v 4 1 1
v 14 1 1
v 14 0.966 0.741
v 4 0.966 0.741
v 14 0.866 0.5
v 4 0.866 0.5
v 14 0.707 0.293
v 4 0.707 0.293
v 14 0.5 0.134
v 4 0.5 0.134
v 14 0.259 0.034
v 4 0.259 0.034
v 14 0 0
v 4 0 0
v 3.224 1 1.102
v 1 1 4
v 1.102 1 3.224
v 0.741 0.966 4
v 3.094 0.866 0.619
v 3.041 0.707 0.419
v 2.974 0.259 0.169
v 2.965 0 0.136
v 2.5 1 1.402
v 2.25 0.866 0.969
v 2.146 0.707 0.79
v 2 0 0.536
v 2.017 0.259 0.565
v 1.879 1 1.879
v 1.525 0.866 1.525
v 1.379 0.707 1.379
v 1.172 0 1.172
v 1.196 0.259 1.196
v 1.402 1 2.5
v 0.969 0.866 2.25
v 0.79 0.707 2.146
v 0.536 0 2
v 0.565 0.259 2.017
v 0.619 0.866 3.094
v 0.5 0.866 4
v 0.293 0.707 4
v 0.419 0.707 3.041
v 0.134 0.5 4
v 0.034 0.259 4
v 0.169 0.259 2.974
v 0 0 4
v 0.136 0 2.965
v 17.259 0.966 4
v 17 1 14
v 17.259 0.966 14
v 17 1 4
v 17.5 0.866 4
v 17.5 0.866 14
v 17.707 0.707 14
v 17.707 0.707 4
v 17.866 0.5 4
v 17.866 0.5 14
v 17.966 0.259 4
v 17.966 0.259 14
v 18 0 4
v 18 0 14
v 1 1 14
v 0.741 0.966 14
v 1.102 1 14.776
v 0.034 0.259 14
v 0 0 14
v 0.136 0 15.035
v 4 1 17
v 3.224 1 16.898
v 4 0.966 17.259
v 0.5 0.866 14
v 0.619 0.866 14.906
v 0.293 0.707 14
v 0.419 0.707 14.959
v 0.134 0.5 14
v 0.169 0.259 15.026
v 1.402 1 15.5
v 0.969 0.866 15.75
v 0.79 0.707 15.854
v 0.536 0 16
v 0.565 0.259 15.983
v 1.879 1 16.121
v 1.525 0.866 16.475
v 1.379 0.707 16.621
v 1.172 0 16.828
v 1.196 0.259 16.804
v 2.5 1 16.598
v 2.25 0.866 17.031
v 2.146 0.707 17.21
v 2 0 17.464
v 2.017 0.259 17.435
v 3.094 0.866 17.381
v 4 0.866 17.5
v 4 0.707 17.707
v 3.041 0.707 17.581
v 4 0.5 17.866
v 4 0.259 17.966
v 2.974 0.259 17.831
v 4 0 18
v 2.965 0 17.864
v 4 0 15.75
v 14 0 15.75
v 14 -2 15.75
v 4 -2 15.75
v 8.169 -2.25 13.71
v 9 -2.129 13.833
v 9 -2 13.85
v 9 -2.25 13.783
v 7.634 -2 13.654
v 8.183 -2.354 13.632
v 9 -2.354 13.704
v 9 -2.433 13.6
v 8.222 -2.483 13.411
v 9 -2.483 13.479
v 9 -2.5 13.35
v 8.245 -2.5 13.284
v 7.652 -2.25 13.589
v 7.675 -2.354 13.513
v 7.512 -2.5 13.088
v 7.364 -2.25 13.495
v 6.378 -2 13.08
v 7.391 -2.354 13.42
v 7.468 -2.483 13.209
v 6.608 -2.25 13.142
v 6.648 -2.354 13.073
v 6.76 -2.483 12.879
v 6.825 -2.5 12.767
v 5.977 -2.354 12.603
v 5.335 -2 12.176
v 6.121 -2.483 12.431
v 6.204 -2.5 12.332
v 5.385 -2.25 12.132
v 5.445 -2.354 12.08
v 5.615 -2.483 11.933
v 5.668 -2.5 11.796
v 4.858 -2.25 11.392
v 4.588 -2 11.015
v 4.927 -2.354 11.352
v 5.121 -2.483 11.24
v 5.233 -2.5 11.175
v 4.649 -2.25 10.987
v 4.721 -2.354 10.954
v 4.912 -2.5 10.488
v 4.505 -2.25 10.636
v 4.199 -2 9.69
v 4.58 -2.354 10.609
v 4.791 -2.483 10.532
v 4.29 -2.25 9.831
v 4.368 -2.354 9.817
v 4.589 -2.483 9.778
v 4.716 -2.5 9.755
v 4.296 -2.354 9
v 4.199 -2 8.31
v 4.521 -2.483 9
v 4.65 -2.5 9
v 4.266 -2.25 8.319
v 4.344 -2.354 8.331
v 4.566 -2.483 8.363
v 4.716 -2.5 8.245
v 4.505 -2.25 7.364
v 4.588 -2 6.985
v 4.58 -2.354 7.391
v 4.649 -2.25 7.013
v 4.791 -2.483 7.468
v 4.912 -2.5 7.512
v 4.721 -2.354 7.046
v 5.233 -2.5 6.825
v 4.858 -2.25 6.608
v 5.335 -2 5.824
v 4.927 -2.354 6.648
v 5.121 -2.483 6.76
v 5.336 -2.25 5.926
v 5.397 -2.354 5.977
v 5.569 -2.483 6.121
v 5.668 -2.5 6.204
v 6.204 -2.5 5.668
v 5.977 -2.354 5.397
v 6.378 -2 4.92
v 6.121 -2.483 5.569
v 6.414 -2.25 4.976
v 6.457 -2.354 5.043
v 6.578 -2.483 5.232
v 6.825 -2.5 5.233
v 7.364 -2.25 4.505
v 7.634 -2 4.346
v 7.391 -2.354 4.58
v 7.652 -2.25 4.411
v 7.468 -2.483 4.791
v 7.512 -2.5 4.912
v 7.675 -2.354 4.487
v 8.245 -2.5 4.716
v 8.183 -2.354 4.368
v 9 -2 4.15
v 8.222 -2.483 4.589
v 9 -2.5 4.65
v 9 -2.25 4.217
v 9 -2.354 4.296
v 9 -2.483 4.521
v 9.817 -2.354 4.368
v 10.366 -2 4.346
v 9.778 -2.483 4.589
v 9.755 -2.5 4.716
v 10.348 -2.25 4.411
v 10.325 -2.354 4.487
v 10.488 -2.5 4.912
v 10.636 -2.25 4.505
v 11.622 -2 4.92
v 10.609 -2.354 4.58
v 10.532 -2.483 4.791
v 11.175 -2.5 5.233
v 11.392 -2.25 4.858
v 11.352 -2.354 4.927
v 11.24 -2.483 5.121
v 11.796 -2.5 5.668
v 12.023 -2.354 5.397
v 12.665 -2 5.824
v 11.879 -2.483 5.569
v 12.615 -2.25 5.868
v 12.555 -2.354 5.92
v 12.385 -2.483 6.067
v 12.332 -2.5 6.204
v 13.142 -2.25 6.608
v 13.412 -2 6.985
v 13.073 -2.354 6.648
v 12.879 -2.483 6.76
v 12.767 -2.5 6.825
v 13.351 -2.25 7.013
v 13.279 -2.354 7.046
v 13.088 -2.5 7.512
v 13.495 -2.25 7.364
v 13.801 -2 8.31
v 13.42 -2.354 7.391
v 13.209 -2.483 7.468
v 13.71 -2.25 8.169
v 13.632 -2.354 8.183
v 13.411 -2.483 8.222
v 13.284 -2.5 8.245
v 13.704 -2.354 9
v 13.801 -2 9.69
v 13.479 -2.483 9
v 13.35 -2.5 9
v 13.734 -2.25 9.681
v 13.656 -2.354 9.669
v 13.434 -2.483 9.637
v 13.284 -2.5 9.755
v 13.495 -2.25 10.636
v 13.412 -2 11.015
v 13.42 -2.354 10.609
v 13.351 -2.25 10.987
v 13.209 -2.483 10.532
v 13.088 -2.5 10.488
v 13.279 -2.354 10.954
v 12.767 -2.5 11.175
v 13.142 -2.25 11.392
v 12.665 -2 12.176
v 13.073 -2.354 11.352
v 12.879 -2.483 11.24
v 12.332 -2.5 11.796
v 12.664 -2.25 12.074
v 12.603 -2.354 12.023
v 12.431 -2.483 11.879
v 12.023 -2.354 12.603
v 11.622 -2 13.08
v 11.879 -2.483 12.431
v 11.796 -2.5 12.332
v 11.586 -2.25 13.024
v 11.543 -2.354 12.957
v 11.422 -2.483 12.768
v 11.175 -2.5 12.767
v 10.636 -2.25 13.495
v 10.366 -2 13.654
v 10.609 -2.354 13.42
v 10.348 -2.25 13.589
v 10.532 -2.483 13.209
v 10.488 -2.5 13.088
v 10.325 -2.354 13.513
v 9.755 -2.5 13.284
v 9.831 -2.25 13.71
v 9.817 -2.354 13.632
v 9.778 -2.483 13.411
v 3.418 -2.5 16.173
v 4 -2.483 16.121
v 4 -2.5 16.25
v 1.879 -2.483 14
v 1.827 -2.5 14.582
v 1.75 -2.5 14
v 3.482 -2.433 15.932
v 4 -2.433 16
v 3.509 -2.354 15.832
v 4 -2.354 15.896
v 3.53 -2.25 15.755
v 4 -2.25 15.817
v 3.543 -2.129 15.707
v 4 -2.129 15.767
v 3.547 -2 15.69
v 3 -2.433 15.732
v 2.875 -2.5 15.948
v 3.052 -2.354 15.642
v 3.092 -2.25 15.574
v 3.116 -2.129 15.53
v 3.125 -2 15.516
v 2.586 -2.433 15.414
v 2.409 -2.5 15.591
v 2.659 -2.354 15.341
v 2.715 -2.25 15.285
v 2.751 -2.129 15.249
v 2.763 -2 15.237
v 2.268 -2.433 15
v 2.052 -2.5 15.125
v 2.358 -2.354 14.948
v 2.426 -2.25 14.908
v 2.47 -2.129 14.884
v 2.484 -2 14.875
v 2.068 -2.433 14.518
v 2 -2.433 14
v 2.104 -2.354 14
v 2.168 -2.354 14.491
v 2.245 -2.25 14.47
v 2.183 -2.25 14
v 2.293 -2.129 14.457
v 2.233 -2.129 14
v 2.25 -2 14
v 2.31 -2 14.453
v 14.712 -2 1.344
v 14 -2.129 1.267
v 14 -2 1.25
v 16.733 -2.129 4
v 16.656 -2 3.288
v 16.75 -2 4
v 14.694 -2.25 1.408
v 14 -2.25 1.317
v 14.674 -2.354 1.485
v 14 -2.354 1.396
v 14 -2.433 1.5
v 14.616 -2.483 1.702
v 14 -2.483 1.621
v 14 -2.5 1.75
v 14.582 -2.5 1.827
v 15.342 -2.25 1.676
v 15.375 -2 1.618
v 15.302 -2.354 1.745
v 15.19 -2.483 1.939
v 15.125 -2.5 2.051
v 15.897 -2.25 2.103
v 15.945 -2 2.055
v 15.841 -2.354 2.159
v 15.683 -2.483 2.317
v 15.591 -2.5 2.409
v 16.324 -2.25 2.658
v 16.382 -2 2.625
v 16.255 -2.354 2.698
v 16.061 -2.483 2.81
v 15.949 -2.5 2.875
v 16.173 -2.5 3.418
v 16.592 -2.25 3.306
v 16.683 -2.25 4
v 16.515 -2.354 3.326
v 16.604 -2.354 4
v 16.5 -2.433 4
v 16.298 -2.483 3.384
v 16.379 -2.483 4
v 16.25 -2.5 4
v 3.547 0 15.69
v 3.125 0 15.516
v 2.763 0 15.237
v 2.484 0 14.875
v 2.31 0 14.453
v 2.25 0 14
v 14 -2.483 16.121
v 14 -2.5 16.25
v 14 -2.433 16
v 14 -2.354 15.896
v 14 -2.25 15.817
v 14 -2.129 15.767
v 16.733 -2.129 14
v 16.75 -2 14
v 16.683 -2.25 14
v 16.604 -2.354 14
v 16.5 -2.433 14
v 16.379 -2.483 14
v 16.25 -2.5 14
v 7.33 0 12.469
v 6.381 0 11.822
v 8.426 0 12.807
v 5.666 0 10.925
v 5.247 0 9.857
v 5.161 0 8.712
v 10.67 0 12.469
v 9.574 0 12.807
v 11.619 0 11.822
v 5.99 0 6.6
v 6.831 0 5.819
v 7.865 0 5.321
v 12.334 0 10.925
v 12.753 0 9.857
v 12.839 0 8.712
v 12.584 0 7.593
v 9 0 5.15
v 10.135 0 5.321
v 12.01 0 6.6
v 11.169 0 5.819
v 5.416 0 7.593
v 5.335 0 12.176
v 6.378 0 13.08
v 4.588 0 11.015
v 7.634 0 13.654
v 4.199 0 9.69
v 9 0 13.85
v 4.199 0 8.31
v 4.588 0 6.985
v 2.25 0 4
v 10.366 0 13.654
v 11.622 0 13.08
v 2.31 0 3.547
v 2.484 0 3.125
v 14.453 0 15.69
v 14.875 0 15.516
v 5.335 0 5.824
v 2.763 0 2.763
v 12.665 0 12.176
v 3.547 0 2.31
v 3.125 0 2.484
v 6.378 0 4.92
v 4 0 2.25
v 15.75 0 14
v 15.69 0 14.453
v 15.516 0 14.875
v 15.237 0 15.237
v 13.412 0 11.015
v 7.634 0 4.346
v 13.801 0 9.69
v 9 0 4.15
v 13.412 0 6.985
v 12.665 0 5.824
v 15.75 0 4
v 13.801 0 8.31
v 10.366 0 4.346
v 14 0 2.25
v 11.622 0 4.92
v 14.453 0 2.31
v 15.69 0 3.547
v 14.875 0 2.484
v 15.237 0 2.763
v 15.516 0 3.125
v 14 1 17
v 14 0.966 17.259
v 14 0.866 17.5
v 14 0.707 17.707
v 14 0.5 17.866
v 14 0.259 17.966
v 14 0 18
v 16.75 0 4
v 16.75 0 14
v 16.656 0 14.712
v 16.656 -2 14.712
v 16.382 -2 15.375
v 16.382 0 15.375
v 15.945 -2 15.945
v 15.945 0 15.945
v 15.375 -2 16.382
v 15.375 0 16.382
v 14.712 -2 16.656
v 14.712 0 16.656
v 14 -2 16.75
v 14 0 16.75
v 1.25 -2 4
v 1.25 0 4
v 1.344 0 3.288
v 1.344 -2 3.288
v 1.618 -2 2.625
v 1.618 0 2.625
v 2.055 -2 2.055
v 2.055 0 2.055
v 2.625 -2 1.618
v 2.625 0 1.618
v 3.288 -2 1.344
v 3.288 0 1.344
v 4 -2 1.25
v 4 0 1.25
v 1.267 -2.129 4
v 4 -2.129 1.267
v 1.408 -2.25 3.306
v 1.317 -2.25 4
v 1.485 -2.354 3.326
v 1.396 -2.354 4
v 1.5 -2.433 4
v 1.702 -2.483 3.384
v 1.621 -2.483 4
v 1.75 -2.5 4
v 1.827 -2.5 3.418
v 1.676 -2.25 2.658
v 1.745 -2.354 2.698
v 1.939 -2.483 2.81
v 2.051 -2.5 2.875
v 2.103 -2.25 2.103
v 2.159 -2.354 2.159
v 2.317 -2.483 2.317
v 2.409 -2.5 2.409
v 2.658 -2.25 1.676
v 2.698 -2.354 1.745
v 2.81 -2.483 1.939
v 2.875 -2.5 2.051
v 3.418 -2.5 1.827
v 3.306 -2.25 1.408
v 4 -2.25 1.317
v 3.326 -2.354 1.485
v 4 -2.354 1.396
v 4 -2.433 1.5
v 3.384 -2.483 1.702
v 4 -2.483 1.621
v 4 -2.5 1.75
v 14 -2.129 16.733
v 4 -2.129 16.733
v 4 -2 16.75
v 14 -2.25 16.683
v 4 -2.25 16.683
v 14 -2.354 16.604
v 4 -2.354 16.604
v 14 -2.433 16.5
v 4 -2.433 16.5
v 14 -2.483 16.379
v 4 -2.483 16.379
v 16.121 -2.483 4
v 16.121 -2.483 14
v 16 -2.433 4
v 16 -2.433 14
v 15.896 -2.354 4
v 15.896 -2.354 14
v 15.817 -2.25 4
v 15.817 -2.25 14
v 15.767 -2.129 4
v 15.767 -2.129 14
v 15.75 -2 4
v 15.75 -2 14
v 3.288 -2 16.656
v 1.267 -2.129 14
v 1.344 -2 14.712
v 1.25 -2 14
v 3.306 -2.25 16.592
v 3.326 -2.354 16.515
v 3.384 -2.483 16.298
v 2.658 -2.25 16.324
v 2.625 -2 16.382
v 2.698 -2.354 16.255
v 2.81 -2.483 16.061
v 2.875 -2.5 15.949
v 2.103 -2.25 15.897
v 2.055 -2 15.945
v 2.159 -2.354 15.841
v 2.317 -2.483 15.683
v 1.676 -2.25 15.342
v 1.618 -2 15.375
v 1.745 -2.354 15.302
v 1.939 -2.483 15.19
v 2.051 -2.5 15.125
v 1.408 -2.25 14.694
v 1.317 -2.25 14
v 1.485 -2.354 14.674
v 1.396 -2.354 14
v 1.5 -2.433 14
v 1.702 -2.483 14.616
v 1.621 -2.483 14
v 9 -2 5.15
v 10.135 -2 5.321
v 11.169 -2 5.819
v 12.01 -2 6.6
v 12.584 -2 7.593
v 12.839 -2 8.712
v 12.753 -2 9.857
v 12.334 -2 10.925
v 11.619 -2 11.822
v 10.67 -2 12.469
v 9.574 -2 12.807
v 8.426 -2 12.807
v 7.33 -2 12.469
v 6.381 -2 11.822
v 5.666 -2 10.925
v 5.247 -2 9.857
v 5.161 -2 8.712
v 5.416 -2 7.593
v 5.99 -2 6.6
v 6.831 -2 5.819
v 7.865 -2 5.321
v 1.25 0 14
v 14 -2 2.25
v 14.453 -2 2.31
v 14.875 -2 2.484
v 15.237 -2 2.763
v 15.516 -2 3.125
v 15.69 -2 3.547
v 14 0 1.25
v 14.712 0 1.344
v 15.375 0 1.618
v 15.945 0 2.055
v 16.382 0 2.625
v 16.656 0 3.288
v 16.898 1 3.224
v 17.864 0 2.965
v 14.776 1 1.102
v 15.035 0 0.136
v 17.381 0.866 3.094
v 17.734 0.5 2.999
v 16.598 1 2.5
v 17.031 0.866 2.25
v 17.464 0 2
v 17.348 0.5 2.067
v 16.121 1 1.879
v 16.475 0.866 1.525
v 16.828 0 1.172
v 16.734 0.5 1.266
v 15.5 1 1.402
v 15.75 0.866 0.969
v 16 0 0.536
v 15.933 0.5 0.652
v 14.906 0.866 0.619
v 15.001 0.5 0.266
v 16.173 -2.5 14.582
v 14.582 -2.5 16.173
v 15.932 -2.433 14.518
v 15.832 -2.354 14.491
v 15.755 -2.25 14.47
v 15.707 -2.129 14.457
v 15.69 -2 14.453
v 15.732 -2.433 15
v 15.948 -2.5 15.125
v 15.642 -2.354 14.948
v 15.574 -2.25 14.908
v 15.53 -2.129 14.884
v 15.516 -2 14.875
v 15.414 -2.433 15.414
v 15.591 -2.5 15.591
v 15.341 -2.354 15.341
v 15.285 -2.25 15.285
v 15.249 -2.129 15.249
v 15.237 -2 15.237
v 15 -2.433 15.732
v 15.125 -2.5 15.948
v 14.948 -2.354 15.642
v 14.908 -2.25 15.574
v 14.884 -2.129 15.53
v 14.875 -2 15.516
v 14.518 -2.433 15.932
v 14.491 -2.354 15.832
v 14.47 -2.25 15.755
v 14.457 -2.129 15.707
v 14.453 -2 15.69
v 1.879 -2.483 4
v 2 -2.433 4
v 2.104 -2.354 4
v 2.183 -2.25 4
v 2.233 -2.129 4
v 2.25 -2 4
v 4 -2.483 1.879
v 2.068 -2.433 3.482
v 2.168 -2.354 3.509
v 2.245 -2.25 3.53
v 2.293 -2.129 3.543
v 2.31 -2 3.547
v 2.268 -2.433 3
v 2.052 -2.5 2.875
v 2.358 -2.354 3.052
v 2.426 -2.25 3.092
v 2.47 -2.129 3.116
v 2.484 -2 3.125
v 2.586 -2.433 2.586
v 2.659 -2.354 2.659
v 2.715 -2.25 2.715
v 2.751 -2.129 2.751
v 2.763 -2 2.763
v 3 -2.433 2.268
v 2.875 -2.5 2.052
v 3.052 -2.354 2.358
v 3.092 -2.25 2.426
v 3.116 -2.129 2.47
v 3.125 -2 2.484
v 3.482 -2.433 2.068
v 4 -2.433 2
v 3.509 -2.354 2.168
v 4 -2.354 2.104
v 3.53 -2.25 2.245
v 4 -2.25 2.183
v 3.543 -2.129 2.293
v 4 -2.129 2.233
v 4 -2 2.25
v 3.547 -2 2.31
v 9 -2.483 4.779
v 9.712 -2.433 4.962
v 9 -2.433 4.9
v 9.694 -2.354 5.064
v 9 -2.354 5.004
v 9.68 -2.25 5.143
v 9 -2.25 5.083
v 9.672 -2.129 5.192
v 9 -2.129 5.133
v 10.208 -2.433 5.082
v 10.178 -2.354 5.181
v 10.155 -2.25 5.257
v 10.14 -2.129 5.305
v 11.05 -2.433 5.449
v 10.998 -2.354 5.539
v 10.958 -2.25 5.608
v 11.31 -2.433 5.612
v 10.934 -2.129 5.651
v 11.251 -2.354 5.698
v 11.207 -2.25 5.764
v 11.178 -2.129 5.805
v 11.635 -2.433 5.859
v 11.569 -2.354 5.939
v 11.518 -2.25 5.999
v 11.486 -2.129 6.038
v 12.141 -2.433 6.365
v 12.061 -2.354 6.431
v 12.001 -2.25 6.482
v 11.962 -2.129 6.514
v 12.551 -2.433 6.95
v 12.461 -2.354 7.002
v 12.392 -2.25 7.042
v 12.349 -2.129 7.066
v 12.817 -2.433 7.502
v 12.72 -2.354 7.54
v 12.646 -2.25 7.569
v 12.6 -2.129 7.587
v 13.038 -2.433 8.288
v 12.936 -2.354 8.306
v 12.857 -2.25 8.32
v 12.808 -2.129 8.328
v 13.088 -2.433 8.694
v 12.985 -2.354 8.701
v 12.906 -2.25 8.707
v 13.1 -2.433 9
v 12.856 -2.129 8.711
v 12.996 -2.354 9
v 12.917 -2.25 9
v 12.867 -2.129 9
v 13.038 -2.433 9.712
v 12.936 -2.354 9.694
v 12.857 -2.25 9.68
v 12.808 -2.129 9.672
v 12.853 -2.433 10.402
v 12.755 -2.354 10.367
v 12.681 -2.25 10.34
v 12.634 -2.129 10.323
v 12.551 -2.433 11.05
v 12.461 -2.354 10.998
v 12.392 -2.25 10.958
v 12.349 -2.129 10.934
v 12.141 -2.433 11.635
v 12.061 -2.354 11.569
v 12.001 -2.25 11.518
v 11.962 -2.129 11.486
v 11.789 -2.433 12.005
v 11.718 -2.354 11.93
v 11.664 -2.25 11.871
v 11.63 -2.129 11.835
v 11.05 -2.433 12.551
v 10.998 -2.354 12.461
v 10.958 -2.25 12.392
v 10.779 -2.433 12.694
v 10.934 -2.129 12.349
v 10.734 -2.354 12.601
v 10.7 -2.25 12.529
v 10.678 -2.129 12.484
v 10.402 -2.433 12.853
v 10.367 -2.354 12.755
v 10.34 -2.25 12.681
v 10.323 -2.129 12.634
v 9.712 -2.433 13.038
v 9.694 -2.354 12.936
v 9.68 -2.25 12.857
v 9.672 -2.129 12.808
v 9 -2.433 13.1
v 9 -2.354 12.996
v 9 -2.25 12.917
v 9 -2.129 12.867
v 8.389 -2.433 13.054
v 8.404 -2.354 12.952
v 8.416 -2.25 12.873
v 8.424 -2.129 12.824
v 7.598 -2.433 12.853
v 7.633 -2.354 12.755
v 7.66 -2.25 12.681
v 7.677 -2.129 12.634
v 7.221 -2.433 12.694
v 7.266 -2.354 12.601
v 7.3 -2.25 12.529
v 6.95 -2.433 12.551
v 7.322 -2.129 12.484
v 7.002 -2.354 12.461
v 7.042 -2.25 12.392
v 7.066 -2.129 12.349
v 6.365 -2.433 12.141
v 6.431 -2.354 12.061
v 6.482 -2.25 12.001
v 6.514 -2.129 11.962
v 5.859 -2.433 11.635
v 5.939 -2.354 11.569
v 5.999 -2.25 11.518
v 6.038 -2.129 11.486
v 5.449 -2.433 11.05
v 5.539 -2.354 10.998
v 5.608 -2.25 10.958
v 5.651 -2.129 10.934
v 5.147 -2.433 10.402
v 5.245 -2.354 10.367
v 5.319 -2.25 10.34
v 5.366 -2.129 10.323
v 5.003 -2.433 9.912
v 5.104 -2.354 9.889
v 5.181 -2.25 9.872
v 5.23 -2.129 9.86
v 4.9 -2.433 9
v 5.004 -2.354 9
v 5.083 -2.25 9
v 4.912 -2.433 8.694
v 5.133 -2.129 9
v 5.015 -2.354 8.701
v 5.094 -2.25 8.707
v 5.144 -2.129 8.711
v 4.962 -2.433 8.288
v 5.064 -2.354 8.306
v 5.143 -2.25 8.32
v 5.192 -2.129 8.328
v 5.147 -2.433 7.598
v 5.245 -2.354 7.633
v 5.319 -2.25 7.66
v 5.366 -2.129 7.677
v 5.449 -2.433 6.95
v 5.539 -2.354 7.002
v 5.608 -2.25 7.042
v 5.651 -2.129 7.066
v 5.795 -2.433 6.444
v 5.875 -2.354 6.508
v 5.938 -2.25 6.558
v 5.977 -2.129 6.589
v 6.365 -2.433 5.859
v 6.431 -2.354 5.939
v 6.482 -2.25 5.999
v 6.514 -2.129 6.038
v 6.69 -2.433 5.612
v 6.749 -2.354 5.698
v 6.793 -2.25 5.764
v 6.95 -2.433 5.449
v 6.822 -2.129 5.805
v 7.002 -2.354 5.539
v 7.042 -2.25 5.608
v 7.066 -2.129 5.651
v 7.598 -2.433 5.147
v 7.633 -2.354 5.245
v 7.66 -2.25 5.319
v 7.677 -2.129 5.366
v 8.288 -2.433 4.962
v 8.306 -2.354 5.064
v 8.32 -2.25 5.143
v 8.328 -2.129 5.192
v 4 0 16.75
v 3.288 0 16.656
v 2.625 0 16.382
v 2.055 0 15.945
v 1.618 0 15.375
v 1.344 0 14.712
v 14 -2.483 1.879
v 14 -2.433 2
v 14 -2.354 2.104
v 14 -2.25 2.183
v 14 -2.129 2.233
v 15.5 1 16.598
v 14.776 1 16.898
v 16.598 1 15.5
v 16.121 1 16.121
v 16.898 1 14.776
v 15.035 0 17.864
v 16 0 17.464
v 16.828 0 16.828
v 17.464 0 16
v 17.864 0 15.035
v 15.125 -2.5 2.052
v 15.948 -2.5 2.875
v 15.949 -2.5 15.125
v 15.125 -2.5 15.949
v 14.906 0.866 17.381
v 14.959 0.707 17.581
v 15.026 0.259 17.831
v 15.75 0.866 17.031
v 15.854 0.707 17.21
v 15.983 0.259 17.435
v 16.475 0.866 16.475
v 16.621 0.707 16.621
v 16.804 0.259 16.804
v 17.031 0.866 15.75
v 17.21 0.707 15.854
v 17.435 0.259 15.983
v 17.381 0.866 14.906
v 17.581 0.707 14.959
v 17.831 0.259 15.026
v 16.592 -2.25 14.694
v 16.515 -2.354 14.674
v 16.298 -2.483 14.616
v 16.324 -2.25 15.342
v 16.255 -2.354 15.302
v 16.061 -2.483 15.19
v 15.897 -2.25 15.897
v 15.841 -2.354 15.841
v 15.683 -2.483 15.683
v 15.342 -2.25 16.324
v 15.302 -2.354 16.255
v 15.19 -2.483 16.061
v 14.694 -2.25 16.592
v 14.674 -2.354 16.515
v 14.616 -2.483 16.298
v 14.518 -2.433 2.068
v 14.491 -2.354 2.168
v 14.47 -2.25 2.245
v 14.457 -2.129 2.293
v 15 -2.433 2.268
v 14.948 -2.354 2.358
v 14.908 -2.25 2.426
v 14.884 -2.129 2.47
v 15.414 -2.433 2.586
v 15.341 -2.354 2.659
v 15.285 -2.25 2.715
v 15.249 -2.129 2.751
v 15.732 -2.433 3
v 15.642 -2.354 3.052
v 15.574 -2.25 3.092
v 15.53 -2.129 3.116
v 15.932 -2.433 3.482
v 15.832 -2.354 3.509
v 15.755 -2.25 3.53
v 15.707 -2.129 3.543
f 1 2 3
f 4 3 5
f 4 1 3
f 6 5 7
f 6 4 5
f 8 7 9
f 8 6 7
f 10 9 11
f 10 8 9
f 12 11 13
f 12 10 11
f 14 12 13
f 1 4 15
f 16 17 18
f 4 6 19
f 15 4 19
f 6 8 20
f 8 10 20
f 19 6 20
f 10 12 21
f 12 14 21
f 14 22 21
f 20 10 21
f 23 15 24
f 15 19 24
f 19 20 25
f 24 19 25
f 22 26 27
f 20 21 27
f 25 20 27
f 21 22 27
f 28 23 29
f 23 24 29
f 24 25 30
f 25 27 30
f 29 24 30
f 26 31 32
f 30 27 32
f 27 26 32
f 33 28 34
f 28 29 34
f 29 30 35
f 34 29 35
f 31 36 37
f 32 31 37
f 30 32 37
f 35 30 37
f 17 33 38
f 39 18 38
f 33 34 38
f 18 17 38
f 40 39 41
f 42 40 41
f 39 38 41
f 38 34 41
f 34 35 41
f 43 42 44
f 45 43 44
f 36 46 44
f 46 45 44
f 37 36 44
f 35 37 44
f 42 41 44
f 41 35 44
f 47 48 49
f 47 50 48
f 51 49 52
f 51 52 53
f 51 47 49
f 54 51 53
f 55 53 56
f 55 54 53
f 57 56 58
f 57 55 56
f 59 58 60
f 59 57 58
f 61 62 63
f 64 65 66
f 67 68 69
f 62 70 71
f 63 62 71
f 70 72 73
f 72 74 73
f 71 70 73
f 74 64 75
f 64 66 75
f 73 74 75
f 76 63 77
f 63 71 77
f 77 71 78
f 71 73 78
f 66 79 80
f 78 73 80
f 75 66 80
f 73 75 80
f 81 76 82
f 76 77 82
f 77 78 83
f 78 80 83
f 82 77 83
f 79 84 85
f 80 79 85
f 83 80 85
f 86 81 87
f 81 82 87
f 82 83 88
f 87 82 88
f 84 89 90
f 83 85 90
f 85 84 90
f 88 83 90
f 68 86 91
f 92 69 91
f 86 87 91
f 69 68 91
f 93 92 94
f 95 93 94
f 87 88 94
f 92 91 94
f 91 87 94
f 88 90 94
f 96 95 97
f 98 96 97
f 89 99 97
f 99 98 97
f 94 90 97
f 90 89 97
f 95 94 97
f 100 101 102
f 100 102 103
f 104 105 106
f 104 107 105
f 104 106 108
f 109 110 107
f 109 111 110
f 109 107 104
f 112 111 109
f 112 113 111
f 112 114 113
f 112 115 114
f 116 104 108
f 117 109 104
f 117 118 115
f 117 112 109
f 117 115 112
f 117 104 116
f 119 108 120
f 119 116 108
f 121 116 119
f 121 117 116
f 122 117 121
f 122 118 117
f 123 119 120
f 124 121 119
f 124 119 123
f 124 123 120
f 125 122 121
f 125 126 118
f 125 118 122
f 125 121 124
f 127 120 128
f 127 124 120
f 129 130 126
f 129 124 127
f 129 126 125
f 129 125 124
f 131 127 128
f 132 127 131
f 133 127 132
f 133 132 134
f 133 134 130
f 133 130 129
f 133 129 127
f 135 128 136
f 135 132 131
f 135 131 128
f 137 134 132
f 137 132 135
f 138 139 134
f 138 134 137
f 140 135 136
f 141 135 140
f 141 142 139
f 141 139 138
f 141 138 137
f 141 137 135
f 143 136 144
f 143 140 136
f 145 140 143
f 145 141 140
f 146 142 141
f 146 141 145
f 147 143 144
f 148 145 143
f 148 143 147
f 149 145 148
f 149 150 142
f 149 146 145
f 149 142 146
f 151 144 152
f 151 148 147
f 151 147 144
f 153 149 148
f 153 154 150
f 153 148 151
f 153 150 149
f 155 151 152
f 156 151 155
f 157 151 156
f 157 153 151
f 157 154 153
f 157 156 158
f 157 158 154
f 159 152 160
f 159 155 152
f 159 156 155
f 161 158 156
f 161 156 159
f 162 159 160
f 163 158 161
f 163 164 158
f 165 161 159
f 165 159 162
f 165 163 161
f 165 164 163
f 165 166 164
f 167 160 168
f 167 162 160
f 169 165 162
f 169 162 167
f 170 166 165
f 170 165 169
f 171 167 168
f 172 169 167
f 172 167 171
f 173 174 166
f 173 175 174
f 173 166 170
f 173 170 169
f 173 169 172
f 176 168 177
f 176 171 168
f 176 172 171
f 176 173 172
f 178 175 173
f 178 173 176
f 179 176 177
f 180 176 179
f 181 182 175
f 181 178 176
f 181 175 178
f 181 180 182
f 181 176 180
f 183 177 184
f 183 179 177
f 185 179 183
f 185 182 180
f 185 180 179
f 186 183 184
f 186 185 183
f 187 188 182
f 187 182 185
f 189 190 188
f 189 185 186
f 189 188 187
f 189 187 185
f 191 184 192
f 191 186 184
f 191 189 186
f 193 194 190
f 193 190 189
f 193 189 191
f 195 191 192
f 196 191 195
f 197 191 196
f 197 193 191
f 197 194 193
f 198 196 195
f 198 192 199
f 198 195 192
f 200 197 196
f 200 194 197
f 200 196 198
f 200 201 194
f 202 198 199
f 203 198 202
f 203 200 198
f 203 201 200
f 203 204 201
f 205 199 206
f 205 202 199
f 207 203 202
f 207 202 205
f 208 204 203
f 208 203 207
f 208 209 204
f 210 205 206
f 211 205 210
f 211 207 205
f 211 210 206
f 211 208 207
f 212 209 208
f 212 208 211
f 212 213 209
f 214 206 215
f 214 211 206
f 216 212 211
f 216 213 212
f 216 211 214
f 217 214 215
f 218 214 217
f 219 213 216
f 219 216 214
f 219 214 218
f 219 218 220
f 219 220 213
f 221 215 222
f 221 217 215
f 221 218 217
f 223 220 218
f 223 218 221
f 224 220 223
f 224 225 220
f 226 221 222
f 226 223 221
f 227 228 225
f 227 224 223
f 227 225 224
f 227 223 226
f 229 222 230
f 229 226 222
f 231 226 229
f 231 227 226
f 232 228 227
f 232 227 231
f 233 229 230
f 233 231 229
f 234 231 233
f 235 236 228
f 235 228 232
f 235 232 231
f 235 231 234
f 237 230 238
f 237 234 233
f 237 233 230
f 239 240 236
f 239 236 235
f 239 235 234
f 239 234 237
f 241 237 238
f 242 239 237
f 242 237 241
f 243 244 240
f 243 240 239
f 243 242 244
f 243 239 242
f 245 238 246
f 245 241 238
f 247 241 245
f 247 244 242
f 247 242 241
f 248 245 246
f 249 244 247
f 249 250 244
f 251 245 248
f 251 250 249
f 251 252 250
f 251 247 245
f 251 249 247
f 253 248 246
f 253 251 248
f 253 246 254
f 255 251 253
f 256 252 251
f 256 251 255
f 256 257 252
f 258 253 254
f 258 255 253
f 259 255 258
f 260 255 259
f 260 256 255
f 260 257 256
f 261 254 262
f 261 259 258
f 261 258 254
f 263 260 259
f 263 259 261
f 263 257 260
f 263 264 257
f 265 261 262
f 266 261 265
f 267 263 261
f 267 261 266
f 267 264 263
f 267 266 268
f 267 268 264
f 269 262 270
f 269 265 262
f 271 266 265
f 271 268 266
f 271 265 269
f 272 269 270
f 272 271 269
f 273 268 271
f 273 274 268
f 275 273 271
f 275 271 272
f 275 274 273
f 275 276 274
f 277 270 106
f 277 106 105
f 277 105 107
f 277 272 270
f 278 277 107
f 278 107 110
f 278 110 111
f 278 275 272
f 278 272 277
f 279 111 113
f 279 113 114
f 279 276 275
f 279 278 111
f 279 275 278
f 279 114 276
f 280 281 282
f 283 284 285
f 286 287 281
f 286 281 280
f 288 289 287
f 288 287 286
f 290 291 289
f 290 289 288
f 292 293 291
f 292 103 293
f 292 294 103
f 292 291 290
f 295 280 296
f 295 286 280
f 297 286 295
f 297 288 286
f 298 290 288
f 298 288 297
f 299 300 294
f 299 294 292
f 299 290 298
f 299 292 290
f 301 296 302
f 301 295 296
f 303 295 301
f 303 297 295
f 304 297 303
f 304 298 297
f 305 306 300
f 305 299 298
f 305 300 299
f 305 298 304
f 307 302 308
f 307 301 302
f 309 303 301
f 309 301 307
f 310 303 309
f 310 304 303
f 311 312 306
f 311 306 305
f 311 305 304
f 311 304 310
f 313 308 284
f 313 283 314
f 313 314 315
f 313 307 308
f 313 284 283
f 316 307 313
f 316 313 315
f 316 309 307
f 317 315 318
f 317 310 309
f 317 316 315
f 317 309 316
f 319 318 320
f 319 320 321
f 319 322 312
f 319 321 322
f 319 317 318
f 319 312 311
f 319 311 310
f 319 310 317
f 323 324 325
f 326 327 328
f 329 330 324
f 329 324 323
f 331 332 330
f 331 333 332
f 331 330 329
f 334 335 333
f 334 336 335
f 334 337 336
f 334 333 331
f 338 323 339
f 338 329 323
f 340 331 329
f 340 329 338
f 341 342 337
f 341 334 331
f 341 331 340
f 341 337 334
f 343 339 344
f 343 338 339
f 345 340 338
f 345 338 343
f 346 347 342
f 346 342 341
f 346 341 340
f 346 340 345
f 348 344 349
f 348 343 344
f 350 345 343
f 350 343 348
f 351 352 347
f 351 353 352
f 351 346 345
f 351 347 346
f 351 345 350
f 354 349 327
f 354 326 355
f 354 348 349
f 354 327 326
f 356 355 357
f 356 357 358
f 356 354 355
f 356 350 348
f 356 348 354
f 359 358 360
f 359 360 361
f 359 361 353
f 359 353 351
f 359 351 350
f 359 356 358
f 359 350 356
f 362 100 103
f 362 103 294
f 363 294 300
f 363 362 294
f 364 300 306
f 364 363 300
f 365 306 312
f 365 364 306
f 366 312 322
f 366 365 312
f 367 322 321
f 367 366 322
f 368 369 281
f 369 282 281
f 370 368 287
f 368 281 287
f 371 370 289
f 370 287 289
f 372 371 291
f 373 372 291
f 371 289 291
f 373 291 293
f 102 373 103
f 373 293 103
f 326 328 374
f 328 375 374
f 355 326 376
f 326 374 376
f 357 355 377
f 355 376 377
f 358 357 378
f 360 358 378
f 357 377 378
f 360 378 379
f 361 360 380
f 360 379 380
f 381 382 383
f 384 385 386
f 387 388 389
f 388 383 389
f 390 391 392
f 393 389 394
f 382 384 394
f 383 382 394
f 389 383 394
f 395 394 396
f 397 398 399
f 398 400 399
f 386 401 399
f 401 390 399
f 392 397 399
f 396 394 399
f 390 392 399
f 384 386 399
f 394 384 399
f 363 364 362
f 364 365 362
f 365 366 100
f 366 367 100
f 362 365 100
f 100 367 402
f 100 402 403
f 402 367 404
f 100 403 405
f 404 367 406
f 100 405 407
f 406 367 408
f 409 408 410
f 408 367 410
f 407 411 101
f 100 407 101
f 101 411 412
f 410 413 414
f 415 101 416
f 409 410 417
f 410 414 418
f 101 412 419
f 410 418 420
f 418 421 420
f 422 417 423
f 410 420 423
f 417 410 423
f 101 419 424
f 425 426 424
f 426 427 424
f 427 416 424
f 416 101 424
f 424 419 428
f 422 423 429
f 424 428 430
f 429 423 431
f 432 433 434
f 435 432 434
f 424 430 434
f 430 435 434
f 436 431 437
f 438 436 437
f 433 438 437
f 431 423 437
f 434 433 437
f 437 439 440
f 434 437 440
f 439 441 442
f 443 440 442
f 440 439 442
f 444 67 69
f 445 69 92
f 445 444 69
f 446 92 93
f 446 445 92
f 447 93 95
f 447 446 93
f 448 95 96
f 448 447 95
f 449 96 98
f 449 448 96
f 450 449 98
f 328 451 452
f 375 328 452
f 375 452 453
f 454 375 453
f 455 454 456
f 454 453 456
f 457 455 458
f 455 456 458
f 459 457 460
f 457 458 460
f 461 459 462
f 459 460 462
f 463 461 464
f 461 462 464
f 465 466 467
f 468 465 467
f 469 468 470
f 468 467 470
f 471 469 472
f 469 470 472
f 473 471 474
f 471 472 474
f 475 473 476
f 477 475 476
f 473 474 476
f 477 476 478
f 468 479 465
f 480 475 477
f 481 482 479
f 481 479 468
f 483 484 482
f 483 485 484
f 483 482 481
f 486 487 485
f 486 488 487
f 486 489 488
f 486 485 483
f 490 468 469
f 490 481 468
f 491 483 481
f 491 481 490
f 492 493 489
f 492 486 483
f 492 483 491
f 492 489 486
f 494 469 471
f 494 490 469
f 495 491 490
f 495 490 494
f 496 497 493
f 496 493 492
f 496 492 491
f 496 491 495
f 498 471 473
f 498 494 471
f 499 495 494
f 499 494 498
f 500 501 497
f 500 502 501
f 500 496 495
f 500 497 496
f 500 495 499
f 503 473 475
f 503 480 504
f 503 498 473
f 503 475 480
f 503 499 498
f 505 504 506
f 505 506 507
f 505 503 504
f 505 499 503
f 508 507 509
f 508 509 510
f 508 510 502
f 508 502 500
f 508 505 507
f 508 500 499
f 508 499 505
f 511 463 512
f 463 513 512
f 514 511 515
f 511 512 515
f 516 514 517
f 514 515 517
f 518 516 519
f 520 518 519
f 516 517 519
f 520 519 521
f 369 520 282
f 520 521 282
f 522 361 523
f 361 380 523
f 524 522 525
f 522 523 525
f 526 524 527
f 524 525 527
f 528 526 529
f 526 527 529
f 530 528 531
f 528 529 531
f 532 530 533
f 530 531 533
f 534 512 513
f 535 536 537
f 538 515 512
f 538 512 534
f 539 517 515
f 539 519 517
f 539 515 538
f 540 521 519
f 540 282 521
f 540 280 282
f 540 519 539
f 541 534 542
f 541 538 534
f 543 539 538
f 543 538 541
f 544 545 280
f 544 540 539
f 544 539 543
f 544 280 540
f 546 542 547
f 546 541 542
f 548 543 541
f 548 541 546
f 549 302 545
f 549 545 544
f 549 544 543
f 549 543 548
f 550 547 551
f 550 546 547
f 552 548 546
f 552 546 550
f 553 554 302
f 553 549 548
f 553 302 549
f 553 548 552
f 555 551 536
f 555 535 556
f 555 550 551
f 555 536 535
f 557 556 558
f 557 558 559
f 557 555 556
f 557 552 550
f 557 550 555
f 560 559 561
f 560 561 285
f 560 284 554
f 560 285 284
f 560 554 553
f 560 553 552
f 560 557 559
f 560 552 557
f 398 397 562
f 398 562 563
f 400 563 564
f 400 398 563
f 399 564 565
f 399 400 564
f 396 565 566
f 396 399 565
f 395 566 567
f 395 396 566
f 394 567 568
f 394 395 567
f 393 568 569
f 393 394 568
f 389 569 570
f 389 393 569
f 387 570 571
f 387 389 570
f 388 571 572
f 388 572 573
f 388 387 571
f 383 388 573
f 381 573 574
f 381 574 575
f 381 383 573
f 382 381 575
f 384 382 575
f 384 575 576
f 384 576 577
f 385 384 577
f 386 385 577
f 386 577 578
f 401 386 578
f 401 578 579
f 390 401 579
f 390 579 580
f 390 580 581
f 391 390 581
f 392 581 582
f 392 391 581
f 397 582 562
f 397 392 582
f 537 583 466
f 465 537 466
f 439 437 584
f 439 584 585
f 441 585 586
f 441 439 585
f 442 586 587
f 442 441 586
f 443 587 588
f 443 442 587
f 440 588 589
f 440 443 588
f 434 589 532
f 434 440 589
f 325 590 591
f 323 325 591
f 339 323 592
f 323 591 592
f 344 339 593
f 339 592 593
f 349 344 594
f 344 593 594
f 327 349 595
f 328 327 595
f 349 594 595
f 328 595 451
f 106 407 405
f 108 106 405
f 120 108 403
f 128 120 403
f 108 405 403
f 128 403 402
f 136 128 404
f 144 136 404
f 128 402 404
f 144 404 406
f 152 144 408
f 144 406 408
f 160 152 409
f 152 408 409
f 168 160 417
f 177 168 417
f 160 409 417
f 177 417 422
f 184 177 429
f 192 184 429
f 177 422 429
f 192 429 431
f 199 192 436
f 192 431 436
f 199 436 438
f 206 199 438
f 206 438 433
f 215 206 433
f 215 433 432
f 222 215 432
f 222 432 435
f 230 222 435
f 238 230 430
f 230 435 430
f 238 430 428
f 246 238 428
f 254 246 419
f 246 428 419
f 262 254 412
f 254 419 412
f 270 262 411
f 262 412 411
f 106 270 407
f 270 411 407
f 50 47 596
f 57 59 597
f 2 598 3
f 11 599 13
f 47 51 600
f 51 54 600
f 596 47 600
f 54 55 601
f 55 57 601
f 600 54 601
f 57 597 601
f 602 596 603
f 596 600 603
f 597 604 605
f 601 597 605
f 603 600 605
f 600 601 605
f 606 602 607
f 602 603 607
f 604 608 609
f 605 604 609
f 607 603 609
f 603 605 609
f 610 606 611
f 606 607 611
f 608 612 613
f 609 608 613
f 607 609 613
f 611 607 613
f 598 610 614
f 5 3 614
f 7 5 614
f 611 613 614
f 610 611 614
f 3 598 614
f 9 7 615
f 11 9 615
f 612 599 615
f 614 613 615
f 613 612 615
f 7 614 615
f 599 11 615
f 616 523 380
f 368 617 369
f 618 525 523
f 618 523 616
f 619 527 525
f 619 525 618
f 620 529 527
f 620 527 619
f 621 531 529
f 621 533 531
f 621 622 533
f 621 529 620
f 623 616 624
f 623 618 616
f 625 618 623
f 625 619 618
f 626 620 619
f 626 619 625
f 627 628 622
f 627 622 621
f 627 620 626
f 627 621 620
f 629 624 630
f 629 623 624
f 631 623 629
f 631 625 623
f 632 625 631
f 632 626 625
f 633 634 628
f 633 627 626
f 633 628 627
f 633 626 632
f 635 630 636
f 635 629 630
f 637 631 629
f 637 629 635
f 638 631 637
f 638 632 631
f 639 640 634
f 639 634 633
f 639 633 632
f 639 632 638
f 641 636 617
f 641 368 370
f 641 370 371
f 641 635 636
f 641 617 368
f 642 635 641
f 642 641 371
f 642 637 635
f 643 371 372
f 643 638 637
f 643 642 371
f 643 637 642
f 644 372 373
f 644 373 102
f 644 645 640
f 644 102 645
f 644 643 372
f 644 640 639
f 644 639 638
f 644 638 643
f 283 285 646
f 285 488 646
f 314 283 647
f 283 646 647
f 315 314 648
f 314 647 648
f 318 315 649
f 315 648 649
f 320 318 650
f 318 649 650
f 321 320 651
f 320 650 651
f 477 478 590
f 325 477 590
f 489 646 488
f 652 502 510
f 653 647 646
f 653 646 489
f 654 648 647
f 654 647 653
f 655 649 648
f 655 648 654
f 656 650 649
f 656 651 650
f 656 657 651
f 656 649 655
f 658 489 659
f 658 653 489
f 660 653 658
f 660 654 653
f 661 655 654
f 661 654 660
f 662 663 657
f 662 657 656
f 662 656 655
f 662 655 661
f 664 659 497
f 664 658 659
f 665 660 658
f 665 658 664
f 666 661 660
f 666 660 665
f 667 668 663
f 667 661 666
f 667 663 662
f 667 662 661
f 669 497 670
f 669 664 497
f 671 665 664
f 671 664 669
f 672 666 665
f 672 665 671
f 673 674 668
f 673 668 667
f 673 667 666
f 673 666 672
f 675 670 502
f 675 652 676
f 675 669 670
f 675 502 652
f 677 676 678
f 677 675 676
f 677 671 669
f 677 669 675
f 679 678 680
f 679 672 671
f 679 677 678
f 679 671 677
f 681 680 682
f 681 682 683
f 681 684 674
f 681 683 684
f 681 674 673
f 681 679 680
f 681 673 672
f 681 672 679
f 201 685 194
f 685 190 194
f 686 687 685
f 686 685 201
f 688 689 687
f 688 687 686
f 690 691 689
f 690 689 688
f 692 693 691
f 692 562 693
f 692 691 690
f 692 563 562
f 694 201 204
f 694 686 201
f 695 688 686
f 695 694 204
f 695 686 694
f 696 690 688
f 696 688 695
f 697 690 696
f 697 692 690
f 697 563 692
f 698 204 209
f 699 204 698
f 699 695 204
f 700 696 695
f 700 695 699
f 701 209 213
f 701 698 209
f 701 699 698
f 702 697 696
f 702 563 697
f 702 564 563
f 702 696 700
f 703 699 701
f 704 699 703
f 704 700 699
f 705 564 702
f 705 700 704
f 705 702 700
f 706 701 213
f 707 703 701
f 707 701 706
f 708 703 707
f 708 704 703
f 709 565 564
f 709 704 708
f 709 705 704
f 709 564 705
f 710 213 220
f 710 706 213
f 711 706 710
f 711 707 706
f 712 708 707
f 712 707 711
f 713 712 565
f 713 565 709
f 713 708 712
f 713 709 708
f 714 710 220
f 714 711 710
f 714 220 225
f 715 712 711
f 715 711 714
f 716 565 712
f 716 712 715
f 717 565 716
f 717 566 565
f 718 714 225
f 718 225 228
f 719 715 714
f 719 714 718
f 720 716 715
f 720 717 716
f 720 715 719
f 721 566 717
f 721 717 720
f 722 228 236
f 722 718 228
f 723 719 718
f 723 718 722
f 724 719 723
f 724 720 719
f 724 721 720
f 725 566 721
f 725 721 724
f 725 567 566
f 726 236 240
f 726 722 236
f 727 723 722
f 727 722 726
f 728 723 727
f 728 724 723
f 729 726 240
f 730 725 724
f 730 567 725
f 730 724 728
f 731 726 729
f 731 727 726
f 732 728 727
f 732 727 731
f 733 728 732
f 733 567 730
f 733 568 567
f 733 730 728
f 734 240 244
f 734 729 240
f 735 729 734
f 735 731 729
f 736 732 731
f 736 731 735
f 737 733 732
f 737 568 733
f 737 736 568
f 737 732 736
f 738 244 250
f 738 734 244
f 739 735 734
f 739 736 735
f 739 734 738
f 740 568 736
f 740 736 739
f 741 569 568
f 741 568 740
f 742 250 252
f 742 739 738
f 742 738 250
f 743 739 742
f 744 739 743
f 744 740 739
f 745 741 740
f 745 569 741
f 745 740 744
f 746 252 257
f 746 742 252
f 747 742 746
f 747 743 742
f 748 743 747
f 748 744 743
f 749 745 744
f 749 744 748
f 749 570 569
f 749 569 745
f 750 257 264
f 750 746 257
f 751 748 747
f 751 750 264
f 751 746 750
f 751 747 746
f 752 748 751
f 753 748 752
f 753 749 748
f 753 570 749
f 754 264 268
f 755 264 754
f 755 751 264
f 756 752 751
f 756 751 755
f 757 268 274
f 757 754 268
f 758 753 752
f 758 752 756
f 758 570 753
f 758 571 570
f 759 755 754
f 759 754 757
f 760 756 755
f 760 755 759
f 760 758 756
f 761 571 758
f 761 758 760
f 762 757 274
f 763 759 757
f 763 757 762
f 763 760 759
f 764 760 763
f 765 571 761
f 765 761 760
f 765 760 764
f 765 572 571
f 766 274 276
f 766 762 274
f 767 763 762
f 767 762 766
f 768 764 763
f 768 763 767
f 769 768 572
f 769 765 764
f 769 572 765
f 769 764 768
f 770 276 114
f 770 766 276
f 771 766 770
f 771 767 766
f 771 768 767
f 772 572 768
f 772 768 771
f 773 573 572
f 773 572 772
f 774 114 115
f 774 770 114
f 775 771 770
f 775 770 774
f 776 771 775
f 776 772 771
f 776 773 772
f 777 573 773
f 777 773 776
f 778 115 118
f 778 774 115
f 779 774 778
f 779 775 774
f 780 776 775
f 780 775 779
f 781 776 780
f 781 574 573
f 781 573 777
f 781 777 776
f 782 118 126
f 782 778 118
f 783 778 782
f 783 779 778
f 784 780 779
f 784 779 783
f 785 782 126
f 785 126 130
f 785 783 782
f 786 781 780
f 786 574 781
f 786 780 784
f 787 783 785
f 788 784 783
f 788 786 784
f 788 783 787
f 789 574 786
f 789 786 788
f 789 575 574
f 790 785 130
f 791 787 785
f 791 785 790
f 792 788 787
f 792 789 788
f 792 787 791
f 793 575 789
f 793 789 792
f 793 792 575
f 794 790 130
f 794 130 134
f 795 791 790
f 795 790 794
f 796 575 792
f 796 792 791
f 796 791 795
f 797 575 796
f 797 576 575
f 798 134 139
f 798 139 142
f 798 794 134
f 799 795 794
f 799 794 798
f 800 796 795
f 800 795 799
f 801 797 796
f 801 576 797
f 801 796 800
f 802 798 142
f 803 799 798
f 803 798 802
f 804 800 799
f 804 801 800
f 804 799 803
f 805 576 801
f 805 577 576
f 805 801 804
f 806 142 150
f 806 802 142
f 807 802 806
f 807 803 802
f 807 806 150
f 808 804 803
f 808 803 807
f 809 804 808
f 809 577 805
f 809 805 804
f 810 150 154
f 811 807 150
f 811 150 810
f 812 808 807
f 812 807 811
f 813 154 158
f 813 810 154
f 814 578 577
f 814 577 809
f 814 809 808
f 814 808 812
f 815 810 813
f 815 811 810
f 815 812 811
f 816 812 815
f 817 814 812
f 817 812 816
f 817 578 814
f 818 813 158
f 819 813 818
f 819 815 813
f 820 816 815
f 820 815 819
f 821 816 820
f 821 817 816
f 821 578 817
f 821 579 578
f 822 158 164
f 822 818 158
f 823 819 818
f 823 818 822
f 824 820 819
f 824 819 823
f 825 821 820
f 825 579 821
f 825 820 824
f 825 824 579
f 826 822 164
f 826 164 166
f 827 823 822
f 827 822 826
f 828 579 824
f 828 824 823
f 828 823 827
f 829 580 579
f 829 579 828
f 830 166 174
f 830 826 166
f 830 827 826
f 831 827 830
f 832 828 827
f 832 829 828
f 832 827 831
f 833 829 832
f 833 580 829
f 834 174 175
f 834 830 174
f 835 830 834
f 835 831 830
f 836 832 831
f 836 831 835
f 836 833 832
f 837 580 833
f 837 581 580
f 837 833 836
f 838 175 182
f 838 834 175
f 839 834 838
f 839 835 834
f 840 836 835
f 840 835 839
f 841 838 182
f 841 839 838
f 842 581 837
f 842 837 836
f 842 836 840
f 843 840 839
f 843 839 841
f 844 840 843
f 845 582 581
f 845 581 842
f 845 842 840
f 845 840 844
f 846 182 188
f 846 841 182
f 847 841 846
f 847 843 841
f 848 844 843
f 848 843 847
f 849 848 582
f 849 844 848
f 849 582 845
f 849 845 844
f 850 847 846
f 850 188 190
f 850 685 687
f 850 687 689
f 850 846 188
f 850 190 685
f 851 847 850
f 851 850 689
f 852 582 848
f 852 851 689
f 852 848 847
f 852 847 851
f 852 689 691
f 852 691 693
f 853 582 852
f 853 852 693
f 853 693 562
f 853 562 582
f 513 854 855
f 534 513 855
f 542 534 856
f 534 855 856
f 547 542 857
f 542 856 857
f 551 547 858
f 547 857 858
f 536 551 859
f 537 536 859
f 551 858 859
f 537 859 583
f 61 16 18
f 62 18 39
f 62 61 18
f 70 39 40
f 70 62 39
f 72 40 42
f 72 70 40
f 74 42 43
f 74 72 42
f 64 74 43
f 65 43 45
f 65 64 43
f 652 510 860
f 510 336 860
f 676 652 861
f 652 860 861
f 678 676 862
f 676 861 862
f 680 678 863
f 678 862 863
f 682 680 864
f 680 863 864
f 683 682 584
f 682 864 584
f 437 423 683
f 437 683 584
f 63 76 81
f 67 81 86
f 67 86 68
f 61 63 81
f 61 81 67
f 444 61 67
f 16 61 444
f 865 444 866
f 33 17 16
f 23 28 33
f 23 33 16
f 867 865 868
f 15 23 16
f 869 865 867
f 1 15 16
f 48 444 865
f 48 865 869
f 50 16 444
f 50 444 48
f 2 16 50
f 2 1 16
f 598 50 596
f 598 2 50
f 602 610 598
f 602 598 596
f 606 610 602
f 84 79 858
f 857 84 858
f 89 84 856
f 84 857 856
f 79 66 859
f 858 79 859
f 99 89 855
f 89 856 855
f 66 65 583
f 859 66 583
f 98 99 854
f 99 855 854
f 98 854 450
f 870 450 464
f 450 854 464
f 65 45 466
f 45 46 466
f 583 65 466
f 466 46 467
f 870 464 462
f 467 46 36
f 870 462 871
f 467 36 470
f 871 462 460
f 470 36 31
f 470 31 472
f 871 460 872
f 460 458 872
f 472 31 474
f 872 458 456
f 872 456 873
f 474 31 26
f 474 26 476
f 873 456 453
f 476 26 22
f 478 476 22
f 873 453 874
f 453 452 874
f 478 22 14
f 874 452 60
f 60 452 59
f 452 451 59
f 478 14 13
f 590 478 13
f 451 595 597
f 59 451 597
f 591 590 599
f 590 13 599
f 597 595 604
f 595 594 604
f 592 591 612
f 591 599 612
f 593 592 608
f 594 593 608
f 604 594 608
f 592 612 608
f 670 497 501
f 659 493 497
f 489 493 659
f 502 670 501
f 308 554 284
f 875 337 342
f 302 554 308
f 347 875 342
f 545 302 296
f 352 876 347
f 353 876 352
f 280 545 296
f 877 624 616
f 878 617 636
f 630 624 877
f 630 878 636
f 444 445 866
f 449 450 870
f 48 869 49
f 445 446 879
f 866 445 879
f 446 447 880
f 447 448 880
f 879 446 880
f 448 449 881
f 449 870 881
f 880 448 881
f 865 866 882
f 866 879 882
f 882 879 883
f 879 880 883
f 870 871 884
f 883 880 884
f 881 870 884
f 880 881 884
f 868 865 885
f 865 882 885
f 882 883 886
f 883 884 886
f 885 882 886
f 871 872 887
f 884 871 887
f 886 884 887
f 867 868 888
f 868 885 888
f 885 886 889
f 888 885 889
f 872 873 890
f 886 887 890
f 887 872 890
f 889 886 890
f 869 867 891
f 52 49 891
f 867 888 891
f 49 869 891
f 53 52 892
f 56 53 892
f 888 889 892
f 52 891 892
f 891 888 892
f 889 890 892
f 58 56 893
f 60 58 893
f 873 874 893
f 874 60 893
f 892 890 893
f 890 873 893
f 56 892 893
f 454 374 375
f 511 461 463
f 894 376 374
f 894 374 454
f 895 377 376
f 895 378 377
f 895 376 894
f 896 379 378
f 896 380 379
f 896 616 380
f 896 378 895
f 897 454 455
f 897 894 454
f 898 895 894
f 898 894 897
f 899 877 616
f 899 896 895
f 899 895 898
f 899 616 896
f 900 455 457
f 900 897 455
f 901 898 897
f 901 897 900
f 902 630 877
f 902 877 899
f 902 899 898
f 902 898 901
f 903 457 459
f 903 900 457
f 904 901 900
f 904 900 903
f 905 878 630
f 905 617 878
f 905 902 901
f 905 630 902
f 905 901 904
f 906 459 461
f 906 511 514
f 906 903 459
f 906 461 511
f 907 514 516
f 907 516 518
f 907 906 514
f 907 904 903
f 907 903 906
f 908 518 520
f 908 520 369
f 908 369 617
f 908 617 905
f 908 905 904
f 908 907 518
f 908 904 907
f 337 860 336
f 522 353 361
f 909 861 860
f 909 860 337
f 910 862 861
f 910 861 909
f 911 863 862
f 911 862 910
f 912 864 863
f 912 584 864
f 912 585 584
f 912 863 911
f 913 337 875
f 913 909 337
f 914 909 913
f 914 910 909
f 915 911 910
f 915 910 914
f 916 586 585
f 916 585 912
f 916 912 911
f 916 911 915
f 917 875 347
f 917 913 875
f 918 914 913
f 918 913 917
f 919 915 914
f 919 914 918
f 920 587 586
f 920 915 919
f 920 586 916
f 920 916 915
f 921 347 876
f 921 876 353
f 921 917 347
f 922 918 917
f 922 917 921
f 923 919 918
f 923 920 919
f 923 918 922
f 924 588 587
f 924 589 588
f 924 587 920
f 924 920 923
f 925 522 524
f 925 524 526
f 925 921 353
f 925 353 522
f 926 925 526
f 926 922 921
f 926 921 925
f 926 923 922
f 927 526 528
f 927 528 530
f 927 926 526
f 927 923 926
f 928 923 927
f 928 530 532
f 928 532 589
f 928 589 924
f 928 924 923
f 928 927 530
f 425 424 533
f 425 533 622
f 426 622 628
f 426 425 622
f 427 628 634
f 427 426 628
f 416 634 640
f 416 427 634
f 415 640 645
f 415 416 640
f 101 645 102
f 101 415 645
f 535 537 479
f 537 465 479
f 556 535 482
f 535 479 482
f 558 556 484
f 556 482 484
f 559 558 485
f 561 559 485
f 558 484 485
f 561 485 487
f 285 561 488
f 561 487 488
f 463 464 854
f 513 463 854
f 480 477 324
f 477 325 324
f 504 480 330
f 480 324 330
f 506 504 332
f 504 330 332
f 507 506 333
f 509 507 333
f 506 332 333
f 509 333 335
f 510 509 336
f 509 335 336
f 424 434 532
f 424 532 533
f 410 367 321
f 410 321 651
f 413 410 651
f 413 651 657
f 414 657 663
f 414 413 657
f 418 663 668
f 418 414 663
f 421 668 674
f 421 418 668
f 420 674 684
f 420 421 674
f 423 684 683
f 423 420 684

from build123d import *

# Parameters (mm, degrees)
SKETCH1_W           = 18
SKETCH1_H           = 18
BOSS_EXTRUDE1_DEPTH = 1
FILLET1_R           = 4
SKETCH2_R           = 4.85
SKETCH2_R_2         = 3.85
BOSS_EXTRUDE2_DEPTH = 2.5
FILLET2_R           = 1
FILLET3_R           = 0.5


with BuildPart() as part:
    # Sketch1 → Boss-Extrude1 (new body)
    with BuildSketch(Plane(origin=(0, 0, 0), x_dir=(1, 0, 0), z_dir=(0, 1, 0))):
        with Locations((9, -9)):
            Rectangle(SKETCH1_W, SKETCH1_H)
    extrude(amount=BOSS_EXTRUDE1_DEPTH)

    # Fillet1
    fillet1_edges = [part.edges().sort_by_distance(p)[0] for p in [
        (0, 0.5, 0),
        (18, 0.5, 0),
        (18, 0.5, 18),
        (0, 0.5, 18),
    ]]
    fillet(fillet1_edges, radius=FILLET1_R)

    # Sketch2 → Boss-Extrude2 (add)
    # profile 1 of 2: a face of its own
    with BuildSketch(Plane.XZ):
        with BuildLine():
            Line((1.25, 14), (1.25, 4))
            ThreePointArc((1.25, 4), (2.055456352, 2.055456352), (4, 1.25))
            Line((4, 1.25), (14, 1.25))
            ThreePointArc((14, 1.25), (15.944543648, 2.055456352), (16.75, 4))
            Line((16.75, 4), (16.75, 14))
            ThreePointArc((16.75, 14), (15.944543648, 15.944543648), (14, 16.75))
            Line((14, 16.75), (4, 16.75))
            ThreePointArc((4, 16.75), (2.055456352, 15.944543648), (1.25, 14))
        make_face()
        with BuildLine():
            Line((2.25, 14), (2.25, 4))
            ThreePointArc((2.25, 4), (2.762563133, 2.762563133), (4, 2.25))
            Line((4, 2.25), (14, 2.25))
            ThreePointArc((14, 2.25), (15.237436867, 2.762563133), (15.75, 4))
            Line((15.75, 4), (15.75, 14))
            ThreePointArc((15.75, 14), (15.237436867, 15.237436867), (14, 15.75))
            Line((14, 15.75), (4, 15.75))
            ThreePointArc((4, 15.75), (2.762563133, 15.237436867), (2.25, 14))
        make_face(mode=Mode.SUBTRACT)
    # profile 2 of 2: a face of its own
    with BuildSketch(Plane.XZ):
        with Locations(Location((9, 9, 0), (0, 0, 90))):
            Circle(SKETCH2_R)
        with Locations(Location((9, 9, 0), (0, 0, 270))):
            Circle(SKETCH2_R_2, mode=Mode.SUBTRACT)
    extrude(amount=BOSS_EXTRUDE2_DEPTH)

    # Fillet2
    fillet2_edges = [part.edges().sort_by_distance(p)[0] for p in [
        (16.828427125, 1, 1.171572875),
        (18, 1, 9),
        (16.828427125, 1, 16.828427125),
        (9, 1, 18),
        (1.171572875, 1, 16.828427125),
        (0, 1, 9),
        (1.171572875, 1, 1.171572875),
        (9, 1, 0),
    ]]
    fillet(fillet2_edges, radius=FILLET2_R - 0.0001)  # a hair under: the kernel refuses the full size

    # Fillet3
    fillet3_edges = [part.edges().sort_by_distance(p)[0] for p in [
        (2.762563133, -2.5, 15.237436867),
        (9, -2.5, 15.75),
        (15.237436867, -2.5, 15.237436867),
        (15.75, -2.5, 9),
        (15.237436867, -2.5, 2.762563133),
        (9, -2.5, 2.25),
        (2.762563133, -2.5, 2.762563133),
        (2.25, -2.5, 9),
        (9, -2.5, 16.75),
        (2.055456352, -2.5, 15.944543648),
        (1.25, -2.5, 9),
        (2.055456352, -2.5, 2.055456352),
        (9, -2.5, 1.25),
        (15.944543648, -2.5, 2.055456352),
        (16.75, -2.5, 9),
        (15.944543648, -2.5, 15.944543648),
        (9, -2.5, 12.85),
        (9, -2.5, 4.15),
    ]]
    fillet(fillet3_edges, radius=FILLET3_R - 0.0001)  # a hair under: the kernel refuses the full size


solid = part.part
